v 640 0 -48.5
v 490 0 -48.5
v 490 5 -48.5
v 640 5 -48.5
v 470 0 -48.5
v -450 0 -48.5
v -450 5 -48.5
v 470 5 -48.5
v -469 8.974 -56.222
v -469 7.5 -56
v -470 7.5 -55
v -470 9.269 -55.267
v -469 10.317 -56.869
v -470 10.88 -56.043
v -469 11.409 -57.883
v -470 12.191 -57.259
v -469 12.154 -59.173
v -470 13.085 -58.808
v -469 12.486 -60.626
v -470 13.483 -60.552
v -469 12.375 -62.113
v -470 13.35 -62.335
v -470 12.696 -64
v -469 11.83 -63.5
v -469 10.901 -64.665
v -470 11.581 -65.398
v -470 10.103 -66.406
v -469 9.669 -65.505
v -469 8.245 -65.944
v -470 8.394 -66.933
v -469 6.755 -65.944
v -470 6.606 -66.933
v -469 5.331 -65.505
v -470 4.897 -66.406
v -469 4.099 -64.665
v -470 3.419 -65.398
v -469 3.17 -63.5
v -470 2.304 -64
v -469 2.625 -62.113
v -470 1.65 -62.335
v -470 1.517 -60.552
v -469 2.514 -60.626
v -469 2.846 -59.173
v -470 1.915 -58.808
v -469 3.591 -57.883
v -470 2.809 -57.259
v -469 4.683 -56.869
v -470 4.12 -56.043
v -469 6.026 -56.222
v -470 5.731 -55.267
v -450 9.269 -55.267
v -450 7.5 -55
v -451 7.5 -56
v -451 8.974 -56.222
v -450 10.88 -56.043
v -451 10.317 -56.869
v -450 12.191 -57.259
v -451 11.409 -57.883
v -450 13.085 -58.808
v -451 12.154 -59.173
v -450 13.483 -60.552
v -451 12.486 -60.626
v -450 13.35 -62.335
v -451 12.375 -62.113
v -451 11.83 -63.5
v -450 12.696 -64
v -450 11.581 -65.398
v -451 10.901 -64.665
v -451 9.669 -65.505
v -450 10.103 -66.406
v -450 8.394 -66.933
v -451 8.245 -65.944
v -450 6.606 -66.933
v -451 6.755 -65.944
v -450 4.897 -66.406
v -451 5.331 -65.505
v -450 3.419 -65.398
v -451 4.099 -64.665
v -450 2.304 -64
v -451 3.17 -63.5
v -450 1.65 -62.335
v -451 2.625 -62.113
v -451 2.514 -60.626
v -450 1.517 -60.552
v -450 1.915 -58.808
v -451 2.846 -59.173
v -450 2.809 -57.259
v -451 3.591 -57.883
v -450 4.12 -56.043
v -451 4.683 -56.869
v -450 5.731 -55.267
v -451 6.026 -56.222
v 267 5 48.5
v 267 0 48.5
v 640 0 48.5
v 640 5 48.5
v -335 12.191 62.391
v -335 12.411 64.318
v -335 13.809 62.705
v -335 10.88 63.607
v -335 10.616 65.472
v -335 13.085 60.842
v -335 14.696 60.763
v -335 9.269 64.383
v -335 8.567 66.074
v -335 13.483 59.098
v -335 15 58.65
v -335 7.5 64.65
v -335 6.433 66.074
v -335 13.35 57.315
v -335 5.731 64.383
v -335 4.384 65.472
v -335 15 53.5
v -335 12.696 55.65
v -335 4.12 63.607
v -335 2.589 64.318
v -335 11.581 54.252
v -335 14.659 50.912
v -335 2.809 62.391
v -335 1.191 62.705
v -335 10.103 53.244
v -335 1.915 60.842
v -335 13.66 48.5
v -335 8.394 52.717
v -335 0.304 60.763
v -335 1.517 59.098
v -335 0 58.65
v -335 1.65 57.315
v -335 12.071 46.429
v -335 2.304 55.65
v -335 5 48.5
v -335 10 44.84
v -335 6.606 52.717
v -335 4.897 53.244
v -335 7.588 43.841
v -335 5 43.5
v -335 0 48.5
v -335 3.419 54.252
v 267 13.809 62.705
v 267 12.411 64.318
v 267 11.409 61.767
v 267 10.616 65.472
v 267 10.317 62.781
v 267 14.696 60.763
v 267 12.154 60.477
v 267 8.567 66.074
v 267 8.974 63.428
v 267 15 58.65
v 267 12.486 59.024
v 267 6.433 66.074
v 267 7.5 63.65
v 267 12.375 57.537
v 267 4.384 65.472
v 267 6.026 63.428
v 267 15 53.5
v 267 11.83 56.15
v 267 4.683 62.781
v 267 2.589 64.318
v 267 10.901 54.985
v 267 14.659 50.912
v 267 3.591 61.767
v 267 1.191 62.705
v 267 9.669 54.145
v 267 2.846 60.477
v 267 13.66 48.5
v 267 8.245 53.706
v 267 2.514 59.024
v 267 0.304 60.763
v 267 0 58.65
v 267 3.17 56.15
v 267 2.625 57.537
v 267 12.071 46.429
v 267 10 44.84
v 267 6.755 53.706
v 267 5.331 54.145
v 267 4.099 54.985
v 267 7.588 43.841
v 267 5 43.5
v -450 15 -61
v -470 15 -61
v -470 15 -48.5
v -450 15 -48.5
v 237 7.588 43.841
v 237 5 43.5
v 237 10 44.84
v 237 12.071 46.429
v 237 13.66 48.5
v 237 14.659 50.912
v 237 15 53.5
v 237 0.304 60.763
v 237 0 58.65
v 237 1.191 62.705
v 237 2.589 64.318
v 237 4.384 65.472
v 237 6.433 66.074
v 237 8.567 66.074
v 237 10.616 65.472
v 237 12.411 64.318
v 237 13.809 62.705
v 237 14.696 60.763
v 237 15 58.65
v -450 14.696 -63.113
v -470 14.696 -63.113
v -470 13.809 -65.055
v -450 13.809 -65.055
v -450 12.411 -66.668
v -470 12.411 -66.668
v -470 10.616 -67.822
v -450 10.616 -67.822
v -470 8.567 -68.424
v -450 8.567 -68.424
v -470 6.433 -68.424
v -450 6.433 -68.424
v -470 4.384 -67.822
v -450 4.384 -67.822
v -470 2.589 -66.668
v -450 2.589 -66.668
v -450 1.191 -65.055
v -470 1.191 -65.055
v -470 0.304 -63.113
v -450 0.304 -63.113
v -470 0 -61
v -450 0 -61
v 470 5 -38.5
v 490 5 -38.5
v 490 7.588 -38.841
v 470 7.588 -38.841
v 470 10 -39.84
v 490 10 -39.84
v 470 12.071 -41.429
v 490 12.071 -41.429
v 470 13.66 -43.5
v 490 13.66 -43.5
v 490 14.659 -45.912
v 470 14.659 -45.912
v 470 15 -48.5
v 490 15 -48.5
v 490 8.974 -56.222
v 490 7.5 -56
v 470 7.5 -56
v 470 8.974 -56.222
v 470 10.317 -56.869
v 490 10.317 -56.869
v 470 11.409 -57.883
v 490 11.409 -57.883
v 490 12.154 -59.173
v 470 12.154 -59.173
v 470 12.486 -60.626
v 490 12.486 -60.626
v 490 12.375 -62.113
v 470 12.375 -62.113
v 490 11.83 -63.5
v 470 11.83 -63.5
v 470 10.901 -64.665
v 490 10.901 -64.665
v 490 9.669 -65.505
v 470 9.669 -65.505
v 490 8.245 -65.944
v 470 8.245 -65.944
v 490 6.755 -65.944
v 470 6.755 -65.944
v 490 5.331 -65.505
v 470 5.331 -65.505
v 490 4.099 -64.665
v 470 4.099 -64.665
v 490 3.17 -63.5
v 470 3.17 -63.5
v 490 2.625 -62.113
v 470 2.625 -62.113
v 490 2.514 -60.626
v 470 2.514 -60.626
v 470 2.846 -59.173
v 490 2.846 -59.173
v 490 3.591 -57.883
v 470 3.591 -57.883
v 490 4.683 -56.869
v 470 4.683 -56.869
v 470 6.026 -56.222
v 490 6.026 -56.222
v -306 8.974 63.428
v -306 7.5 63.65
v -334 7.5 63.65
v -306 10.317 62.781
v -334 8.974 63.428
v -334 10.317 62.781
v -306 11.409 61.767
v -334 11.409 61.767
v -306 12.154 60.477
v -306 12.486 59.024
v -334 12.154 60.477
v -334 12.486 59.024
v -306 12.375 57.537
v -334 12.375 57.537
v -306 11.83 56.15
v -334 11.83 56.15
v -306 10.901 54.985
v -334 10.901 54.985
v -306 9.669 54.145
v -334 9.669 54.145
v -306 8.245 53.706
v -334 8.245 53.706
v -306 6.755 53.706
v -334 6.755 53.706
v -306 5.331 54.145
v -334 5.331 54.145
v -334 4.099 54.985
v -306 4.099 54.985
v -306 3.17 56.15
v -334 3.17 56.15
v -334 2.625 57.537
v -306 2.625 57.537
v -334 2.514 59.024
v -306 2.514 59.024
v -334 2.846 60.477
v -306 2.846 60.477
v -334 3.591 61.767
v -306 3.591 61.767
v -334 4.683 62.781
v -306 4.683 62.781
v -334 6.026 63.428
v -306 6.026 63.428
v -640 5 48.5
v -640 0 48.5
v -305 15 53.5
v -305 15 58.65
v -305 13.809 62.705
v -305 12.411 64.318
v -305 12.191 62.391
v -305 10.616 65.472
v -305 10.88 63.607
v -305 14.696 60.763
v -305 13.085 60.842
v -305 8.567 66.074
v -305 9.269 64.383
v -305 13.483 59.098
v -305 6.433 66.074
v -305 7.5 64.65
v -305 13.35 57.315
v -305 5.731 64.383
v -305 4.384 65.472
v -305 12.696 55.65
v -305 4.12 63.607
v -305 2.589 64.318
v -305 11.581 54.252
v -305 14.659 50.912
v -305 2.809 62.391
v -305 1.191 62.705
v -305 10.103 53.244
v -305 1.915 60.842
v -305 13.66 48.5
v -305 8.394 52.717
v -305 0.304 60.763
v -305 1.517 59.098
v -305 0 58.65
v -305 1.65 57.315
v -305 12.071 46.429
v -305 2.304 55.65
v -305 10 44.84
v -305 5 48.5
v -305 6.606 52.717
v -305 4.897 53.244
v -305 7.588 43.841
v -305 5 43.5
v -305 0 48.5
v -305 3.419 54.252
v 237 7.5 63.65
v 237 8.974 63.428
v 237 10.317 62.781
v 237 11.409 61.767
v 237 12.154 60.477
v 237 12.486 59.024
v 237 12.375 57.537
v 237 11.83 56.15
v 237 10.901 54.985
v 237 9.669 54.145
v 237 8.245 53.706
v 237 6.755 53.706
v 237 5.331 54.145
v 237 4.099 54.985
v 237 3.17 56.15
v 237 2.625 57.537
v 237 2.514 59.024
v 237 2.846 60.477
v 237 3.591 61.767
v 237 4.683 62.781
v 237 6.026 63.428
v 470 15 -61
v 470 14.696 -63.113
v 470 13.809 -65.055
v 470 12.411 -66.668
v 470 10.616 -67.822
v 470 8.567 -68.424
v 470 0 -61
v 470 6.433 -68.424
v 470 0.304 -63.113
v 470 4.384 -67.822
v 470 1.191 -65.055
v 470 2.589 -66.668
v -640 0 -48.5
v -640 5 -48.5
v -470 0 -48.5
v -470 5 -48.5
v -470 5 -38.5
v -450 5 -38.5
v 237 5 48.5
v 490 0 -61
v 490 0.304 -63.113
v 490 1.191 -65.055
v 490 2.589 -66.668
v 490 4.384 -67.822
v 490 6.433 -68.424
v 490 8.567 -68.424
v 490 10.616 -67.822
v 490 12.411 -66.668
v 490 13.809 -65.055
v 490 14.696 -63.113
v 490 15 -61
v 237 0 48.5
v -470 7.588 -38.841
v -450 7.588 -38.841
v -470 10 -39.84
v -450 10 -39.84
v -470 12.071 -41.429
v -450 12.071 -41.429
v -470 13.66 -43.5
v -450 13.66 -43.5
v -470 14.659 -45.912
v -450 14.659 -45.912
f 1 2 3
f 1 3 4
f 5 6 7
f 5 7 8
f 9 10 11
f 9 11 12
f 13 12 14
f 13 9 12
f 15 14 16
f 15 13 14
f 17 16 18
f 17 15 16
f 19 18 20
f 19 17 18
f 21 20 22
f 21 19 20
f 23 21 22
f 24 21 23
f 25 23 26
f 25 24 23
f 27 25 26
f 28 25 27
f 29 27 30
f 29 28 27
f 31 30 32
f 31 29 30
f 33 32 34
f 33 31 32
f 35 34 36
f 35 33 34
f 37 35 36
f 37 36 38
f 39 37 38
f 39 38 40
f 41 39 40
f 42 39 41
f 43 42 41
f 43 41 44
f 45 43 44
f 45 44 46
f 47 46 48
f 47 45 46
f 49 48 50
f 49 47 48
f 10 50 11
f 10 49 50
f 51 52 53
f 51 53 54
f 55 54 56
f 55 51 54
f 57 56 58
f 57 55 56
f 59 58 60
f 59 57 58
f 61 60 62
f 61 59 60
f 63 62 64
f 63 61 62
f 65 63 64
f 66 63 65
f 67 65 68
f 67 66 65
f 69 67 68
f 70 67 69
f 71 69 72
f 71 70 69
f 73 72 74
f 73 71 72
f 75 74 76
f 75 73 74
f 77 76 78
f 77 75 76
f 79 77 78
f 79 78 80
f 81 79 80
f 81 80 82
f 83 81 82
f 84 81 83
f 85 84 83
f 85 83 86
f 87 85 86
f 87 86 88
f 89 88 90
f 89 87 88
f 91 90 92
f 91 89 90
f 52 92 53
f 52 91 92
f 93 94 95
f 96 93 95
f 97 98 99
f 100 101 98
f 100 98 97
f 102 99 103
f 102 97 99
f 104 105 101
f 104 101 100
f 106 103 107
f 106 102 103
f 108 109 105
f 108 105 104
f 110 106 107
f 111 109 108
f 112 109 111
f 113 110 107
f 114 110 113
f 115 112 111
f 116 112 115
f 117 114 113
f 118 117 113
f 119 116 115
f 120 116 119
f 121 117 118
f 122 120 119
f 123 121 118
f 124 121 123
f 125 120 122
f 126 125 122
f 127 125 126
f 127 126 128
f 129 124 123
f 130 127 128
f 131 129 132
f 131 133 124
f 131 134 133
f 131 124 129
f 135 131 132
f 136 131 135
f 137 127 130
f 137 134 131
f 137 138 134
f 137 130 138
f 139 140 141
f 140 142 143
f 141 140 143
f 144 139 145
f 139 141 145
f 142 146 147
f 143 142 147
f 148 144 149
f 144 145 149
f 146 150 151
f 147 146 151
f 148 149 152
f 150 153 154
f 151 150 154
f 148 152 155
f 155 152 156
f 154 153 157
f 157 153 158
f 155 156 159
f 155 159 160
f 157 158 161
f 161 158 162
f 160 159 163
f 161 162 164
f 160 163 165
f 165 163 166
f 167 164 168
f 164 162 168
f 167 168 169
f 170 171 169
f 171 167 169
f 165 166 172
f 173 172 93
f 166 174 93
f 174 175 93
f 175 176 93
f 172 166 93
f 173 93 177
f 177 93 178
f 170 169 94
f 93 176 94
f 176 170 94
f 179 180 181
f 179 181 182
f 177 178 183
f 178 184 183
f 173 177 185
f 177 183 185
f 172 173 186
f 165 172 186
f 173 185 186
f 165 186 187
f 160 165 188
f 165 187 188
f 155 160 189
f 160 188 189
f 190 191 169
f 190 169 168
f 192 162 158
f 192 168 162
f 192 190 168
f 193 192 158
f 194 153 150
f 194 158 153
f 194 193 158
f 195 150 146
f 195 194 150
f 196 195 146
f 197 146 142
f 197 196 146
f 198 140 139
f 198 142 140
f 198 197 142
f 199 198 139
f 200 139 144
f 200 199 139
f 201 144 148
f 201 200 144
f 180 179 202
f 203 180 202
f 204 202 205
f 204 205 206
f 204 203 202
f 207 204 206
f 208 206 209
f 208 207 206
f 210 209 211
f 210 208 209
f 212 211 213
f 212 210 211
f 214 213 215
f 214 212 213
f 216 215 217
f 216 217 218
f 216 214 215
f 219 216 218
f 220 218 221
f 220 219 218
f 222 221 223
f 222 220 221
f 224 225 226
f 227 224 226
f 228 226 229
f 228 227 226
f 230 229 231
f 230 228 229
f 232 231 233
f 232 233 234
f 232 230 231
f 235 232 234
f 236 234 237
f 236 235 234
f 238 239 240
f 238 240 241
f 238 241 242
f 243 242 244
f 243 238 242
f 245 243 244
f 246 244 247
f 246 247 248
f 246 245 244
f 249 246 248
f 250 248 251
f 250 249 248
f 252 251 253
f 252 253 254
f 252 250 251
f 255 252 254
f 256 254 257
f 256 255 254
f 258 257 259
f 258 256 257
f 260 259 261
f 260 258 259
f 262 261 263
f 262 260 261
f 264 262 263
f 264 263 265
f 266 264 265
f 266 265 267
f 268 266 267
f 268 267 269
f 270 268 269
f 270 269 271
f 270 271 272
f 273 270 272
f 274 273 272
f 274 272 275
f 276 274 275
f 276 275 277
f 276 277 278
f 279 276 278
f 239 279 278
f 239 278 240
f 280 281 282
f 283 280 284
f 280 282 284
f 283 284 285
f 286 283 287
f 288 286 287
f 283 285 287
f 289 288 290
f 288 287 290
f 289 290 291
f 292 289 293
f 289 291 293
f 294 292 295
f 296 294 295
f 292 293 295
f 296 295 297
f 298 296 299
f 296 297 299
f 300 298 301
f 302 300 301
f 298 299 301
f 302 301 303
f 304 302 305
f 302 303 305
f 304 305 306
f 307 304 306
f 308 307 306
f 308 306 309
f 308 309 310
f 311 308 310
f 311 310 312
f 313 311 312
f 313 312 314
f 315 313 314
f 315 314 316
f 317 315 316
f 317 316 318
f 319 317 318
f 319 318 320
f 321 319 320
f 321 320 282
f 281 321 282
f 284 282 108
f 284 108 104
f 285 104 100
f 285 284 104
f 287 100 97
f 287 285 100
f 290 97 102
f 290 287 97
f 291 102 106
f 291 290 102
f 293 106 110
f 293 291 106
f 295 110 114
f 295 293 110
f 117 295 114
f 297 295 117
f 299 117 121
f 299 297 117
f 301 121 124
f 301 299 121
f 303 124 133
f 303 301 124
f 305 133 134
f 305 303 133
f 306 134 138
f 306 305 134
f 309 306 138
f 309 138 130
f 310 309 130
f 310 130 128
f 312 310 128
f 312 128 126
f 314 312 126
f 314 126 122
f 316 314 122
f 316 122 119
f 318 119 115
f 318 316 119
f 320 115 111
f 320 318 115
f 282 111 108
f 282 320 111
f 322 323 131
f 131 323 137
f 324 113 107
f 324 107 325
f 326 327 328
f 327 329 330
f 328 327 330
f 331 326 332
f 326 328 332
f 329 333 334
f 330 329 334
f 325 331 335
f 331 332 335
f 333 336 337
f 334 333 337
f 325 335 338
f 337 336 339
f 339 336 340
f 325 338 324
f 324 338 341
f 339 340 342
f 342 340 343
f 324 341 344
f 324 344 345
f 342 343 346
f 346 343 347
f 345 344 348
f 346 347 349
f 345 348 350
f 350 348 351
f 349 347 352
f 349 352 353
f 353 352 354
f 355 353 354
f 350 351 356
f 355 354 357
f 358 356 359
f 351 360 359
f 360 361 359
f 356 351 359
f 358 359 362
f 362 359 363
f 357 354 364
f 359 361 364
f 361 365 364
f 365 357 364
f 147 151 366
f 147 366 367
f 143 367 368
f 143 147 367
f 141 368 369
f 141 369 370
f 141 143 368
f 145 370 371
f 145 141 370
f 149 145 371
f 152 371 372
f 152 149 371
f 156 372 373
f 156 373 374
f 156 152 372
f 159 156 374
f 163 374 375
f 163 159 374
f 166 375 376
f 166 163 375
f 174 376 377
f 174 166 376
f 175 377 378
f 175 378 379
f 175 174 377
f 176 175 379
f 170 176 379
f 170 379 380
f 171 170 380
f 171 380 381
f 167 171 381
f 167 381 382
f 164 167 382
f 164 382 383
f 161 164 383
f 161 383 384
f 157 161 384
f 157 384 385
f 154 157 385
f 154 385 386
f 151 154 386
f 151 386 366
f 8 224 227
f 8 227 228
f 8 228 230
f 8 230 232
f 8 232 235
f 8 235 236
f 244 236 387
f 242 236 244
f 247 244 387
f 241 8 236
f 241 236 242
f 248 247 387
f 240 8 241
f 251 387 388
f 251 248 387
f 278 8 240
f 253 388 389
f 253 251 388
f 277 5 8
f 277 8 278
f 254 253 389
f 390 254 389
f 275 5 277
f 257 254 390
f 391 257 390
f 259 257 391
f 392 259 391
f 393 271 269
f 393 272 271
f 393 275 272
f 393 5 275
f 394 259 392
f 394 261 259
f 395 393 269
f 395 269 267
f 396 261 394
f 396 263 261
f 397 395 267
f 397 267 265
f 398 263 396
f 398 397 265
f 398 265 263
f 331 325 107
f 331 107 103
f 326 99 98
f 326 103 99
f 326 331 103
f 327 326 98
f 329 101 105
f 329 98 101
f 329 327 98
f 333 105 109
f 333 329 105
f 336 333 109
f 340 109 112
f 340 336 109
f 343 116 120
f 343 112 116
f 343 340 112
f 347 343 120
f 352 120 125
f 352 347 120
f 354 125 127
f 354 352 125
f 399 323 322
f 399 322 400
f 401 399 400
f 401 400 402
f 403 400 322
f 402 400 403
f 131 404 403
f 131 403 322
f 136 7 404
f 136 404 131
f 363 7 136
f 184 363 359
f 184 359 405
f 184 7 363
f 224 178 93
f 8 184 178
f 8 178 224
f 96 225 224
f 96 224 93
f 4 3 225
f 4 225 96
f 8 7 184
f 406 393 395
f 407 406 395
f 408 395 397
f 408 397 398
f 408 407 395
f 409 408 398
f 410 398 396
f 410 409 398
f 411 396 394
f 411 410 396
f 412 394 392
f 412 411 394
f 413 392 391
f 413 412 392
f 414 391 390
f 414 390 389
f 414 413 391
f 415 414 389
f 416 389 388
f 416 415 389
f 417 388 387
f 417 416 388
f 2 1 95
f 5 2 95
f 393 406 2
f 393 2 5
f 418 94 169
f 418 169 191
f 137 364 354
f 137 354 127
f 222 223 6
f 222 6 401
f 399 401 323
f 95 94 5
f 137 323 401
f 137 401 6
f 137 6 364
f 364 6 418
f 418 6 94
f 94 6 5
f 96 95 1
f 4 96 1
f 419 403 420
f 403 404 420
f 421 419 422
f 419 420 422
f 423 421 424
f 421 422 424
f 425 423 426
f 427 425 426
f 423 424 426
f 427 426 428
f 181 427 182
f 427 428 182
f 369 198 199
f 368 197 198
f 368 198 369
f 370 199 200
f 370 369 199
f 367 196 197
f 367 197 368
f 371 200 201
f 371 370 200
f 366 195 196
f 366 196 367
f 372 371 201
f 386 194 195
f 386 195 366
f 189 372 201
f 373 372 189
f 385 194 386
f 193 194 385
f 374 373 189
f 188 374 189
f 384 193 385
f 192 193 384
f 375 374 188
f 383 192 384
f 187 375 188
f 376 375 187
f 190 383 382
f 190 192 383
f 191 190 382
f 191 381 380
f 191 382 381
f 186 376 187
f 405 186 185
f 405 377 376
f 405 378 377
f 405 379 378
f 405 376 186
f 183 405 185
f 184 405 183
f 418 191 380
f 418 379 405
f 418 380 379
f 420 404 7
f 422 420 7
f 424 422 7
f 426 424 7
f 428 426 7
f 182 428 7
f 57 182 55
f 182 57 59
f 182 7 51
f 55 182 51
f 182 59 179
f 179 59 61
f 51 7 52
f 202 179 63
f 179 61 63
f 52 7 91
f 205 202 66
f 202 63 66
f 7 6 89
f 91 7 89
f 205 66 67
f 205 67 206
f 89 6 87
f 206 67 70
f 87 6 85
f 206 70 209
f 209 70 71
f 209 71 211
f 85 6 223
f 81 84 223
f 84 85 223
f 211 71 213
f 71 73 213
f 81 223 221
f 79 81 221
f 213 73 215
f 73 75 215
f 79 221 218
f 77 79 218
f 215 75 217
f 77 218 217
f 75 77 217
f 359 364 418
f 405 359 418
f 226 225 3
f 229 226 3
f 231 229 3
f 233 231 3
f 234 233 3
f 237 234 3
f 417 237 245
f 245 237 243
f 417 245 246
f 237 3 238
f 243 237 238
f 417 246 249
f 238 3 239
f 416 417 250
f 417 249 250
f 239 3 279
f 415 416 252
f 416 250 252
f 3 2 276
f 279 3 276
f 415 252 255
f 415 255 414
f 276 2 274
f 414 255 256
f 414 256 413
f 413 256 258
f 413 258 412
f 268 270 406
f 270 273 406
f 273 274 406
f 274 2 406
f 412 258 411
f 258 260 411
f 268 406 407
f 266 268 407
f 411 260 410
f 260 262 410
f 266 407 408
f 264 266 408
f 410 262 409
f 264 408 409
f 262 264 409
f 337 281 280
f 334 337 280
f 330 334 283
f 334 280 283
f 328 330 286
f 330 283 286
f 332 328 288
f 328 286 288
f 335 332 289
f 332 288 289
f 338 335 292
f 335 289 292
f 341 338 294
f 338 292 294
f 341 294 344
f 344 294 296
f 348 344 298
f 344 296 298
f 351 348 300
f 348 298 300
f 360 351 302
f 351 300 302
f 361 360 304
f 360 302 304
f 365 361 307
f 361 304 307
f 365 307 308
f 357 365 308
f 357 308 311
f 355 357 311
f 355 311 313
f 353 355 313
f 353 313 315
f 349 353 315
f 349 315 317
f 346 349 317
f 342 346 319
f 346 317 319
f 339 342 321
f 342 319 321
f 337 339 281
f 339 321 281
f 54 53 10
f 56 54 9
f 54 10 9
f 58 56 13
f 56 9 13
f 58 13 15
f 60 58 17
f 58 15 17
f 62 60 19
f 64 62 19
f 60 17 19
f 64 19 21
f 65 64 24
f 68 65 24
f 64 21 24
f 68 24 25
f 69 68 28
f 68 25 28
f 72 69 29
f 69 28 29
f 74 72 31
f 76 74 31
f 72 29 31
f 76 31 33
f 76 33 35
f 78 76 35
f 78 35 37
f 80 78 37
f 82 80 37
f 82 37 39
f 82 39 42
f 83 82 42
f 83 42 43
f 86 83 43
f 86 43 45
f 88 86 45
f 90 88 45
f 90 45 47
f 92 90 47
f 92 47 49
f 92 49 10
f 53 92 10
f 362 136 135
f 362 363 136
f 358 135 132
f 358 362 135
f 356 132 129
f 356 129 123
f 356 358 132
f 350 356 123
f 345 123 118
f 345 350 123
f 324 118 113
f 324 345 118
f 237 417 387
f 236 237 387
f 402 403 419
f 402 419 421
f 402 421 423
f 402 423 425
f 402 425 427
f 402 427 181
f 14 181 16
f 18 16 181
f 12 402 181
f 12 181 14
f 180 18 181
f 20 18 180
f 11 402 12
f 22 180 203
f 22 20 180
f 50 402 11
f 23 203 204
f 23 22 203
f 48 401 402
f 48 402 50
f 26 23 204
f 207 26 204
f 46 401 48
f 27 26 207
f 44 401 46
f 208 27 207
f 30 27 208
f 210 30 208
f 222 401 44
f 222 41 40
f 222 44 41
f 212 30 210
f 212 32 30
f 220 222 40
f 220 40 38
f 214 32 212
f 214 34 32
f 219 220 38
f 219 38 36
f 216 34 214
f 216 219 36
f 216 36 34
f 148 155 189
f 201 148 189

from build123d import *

# Parameters (mm, degrees)
SZKIC1_W                          = 1280
SZKIC1_H                          = 97
DODANIE_WYCI_GNI_CIE1_DEPTH       = 5
DODANIE_WYCI_GNI_CIE2_START       = -5
SZKIC2_W                          = 20
SZKIC2_H                          = 30
DODANIE_WYCI_GNI_CIE2_DEPTH       = 15
ZAOKR_GLENIE2_RADIUS              = 7.5
ZAOKR_GLENIE2_LENGTH              = 20
WYTNIJ_WYCI_GNI_CIE1_REACH        = 1114.213
SZKIC3_R                          = 5
DODANIE_WYCI_GNI_CIE3_START       = -5
SZKIC4_W                          = 30
SZKIC4_H                          = 22.65
DODANIE_WYCI_GNI_CIE3_DEPTH       = 15
ZAOKR_GLENIE3_R                   = 10
ZAOKR_GLENIE4_RADIUS              = 7.5
ZAOKR_GLENIE4_LENGTH              = 30
WYTNIJ_WYCI_GNI_CIE2_REACH        = 979.518
SZKIC5_R                          = 5
SFAZOWANIE1_SIZE                  = 1
ZAOKR_GLENIE5_R                   = 10
ZAOKR_GLENIE4_OF_LUSTRO2_2_RADIUS = 7.5
ZAOKR_GLENIE4_OF_LUSTRO2_2_LENGTH = 30
ZAOKR_GLENIE5_OF_LUSTRO2_R        = 10
ZAOKR_GLENIE2_OF_LUSTRO3_2_RADIUS = 7.5
ZAOKR_GLENIE2_OF_LUSTRO3_2_LENGTH = 20
ZAOKR_GLENIE3_OF_LUSTRO3_R        = 10


with BuildPart() as part:
    # Szkic1 → Dodanie-wyciągnięcie1 (new body)
    with BuildSketch(Plane(origin=(0, 0, 0), x_dir=(1, 0, 0), z_dir=(0, 1, 0))):
        Rectangle(SZKIC1_W, SZKIC1_H)
    extrude(amount=DODANIE_WYCI_GNI_CIE1_DEPTH)

    # Szkic2 → Dodanie-wyciągnięcie2 (add)
    with BuildSketch(Plane(origin=(0, 5, 0), x_dir=(1, 0, 0), z_dir=(0, 1, 0)).offset(DODANIE_WYCI_GNI_CIE2_START)):
        with Locations((-460, 53.5)):
            Rectangle(SZKIC2_W, SZKIC2_H)
    dodanie_wyci_gni_cie2 = extrude(amount=DODANIE_WYCI_GNI_CIE2_DEPTH)

    # Zaokrąglenie2: full round fillet: the end face becomes a half cylinder, R = half its width
    zaokr_glenie2_face = Plane((-460, 7.5, -68.5), x_dir=(-1, 0, 0), z_dir=(0, 0, -1))  # on the end face: x along it, z out of the body
    zaokr_glenie2_slab = zaokr_glenie2_face.offset(-ZAOKR_GLENIE2_RADIUS / 2) * Box(ZAOKR_GLENIE2_LENGTH, 2 * ZAOKR_GLENIE2_RADIUS, ZAOKR_GLENIE2_RADIUS, mode=Mode.PRIVATE)  # the body's end, R deep
    zaokr_glenie2_round = Plane((-460, 7.5, -61), x_dir=(0, 0, -1), z_dir=(-1, 0, 0)) * Cylinder(ZAOKR_GLENIE2_RADIUS, ZAOKR_GLENIE2_LENGTH, mode=Mode.PRIVATE)  # its axis R under the face
    add(zaokr_glenie2_slab - zaokr_glenie2_round, mode=Mode.SUBTRACT)

    # Szkic3 → Wytnij-wyciągnięcie1 (cut, up to next)
    with BuildSketch(Plane.ZY.offset(470), mode=Mode.PRIVATE) as wytnij_wyci_gni_cie1_sk1:
        with Locations((-61, 7.5)):
            Circle(SZKIC3_R)
    wytnij_wyci_gni_cie1_tool1 = extrude(wytnij_wyci_gni_cie1_sk1.sketch, amount=-WYTNIJ_WYCI_GNI_CIE1_REACH, mode=Mode.PRIVATE) & part.part
    wytnij_wyci_gni_cie1 = wytnij_wyci_gni_cie1_tool1.solids().sort_by_distance((-470, 7.5, -61))[0]
    add(wytnij_wyci_gni_cie1, mode=Mode.SUBTRACT)

    # Szkic4 → Dodanie-wyciągnięcie3 (add)
    with BuildSketch(Plane(origin=(0, 5, 0), x_dir=(1, 0, 0), z_dir=(0, 1, 0)).offset(DODANIE_WYCI_GNI_CIE3_START)):
        with Locations((-320, -54.825)):
            Rectangle(SZKIC4_W, SZKIC4_H)
    dodanie_wyci_gni_cie3 = extrude(amount=DODANIE_WYCI_GNI_CIE3_DEPTH)

    # Zaokrąglenie3
    zaokr_glenie3_edges = [part.edges().sort_by_distance(p)[0] for p in [
        (-460, 15, -38.5),
    ]]
    fillet(zaokr_glenie3_edges, radius=ZAOKR_GLENIE3_R - 0.0001)  # a hair under: the kernel refuses the full size

    # Zaokrąglenie4: full round fillet: the end face becomes a half cylinder, R = half its width
    zaokr_glenie4_face = Plane((-320, 7.5, 66.15), x_dir=(1, 0, 0), z_dir=(0, 0, 1))  # on the end face: x along it, z out of the body
    zaokr_glenie4_slab = zaokr_glenie4_face.offset(-ZAOKR_GLENIE4_RADIUS / 2) * Box(ZAOKR_GLENIE4_LENGTH, 2 * ZAOKR_GLENIE4_RADIUS, ZAOKR_GLENIE4_RADIUS, mode=Mode.PRIVATE)  # the body's end, R deep
    zaokr_glenie4_round = Plane((-320, 7.5, 58.65), x_dir=(0, 0, 1), z_dir=(1, 0, 0)) * Cylinder(ZAOKR_GLENIE4_RADIUS, ZAOKR_GLENIE4_LENGTH, mode=Mode.PRIVATE)  # its axis R under the face
    add(zaokr_glenie4_slab - zaokr_glenie4_round, mode=Mode.SUBTRACT)

    # Szkic5 → Wytnij-wyciągnięcie2 (cut, up to next)
    with BuildSketch(Plane.ZY.offset(335), mode=Mode.PRIVATE) as wytnij_wyci_gni_cie2_sk1:
        with Locations((58.65, 7.5)):
            Circle(SZKIC5_R)
    wytnij_wyci_gni_cie2_tool1 = extrude(wytnij_wyci_gni_cie2_sk1.sketch, amount=-WYTNIJ_WYCI_GNI_CIE2_REACH, mode=Mode.PRIVATE) & part.part
    wytnij_wyci_gni_cie2 = wytnij_wyci_gni_cie2_tool1.solids().sort_by_distance((-335, 7.5, 58.65))[0]
    add(wytnij_wyci_gni_cie2, mode=Mode.SUBTRACT)

    # Sfazowanie1
    sfazowanie1_edges = [part.edges().sort_by_distance(p)[0] for p in [
        (-450, 7.5, -66),
        (-470, 7.5, -66),
        (-305, 7.5, 53.65),
        (-335, 7.5, 53.65),
    ]]
    chamfer(sfazowanie1_edges, length=SFAZOWANIE1_SIZE)

    # Zaokrąglenie5
    zaokr_glenie5_edges = [part.edges().sort_by_distance(p)[0] for p in [
        (-320, 15, 43.5),
    ]]
    fillet(zaokr_glenie5_edges, radius=ZAOKR_GLENIE5_R - 0.0001)  # a hair under: the kernel refuses the full size

    # Lustro2: Dodanie-wyciągnięcie3, Wytnij-wyciągnięcie2 across plane
    add(dodanie_wyci_gni_cie3.mirror(Plane(origin=(-34, 0, 0), x_dir=(0, 0, 1), z_dir=(1, 0, 0))))
    add(wytnij_wyci_gni_cie2.mirror(Plane(origin=(-34, 0, 0), x_dir=(0, 0, 1), z_dir=(1, 0, 0))), mode=Mode.SUBTRACT)

    # Zaokrąglenie4 of Lustro2 2: full round fillet: the end face becomes a half cylinder, R = half its width
    zaokr_glenie4_of_lustro2_2_face = Plane((252, 7.5, 66.15), x_dir=(-1, 0, 0), z_dir=(0, 0, 1))  # on the end face: x along it, z out of the body
    zaokr_glenie4_of_lustro2_2_slab = zaokr_glenie4_of_lustro2_2_face.offset(-ZAOKR_GLENIE4_OF_LUSTRO2_2_RADIUS / 2) * Box(ZAOKR_GLENIE4_OF_LUSTRO2_2_LENGTH, 2 * ZAOKR_GLENIE4_OF_LUSTRO2_2_RADIUS, ZAOKR_GLENIE4_OF_LUSTRO2_2_RADIUS, mode=Mode.PRIVATE)  # the body's end, R deep
    zaokr_glenie4_of_lustro2_2_round = Plane((252, 7.5, 58.65), x_dir=(0, 0, 1), z_dir=(-1, 0, 0)) * Cylinder(ZAOKR_GLENIE4_OF_LUSTRO2_2_RADIUS, ZAOKR_GLENIE4_OF_LUSTRO2_2_LENGTH, mode=Mode.PRIVATE)  # its axis R under the face
    add(zaokr_glenie4_of_lustro2_2_slab - zaokr_glenie4_of_lustro2_2_round, mode=Mode.SUBTRACT)

    # Zaokrąglenie5 of Lustro2
    zaokr_glenie5_of_lustro2_edges = [part.edges().sort_by_distance(p)[0] for p in [
        (252, 15, 43.5),
    ]]
    fillet(zaokr_glenie5_of_lustro2_edges, radius=ZAOKR_GLENIE5_OF_LUSTRO2_R - 0.0001)  # a hair under: the kernel refuses the full size

    # Lustro3: Dodanie-wyciągnięcie2, Wytnij-wyciągnięcie1 across plane
    add(dodanie_wyci_gni_cie2.mirror(Plane(origin=(10, 0, 0), x_dir=(0, 0, 1), z_dir=(1, 0, 0))))
    add(wytnij_wyci_gni_cie1.mirror(Plane(origin=(10, 0, 0), x_dir=(0, 0, 1), z_dir=(1, 0, 0))), mode=Mode.SUBTRACT)

    # Zaokrąglenie2 of Lustro3 2: full round fillet: the end face becomes a half cylinder, R = half its width
    zaokr_glenie2_of_lustro3_2_face = Plane((480, 7.5, -68.5), x_dir=(1, 0, 0), z_dir=(0, 0, -1))  # on the end face: x along it, z out of the body
    zaokr_glenie2_of_lustro3_2_slab = zaokr_glenie2_of_lustro3_2_face.offset(-ZAOKR_GLENIE2_OF_LUSTRO3_2_RADIUS / 2) * Box(ZAOKR_GLENIE2_OF_LUSTRO3_2_LENGTH, 2 * ZAOKR_GLENIE2_OF_LUSTRO3_2_RADIUS, ZAOKR_GLENIE2_OF_LUSTRO3_2_RADIUS, mode=Mode.PRIVATE)  # the body's end, R deep
    zaokr_glenie2_of_lustro3_2_round = Plane((480, 7.5, -61), x_dir=(0, 0, -1), z_dir=(1, 0, 0)) * Cylinder(ZAOKR_GLENIE2_OF_LUSTRO3_2_RADIUS, ZAOKR_GLENIE2_OF_LUSTRO3_2_LENGTH, mode=Mode.PRIVATE)  # its axis R under the face
    add(zaokr_glenie2_of_lustro3_2_slab - zaokr_glenie2_of_lustro3_2_round, mode=Mode.SUBTRACT)

    # Zaokrąglenie3 of Lustro3
    zaokr_glenie3_of_lustro3_edges = [part.edges().sort_by_distance(p)[0] for p in [
        (480, 15, -38.5),
    ]]
    fillet(zaokr_glenie3_of_lustro3_edges, radius=ZAOKR_GLENIE3_OF_LUSTRO3_R - 0.0001)  # a hair under: the kernel refuses the full size


solid = part.part
